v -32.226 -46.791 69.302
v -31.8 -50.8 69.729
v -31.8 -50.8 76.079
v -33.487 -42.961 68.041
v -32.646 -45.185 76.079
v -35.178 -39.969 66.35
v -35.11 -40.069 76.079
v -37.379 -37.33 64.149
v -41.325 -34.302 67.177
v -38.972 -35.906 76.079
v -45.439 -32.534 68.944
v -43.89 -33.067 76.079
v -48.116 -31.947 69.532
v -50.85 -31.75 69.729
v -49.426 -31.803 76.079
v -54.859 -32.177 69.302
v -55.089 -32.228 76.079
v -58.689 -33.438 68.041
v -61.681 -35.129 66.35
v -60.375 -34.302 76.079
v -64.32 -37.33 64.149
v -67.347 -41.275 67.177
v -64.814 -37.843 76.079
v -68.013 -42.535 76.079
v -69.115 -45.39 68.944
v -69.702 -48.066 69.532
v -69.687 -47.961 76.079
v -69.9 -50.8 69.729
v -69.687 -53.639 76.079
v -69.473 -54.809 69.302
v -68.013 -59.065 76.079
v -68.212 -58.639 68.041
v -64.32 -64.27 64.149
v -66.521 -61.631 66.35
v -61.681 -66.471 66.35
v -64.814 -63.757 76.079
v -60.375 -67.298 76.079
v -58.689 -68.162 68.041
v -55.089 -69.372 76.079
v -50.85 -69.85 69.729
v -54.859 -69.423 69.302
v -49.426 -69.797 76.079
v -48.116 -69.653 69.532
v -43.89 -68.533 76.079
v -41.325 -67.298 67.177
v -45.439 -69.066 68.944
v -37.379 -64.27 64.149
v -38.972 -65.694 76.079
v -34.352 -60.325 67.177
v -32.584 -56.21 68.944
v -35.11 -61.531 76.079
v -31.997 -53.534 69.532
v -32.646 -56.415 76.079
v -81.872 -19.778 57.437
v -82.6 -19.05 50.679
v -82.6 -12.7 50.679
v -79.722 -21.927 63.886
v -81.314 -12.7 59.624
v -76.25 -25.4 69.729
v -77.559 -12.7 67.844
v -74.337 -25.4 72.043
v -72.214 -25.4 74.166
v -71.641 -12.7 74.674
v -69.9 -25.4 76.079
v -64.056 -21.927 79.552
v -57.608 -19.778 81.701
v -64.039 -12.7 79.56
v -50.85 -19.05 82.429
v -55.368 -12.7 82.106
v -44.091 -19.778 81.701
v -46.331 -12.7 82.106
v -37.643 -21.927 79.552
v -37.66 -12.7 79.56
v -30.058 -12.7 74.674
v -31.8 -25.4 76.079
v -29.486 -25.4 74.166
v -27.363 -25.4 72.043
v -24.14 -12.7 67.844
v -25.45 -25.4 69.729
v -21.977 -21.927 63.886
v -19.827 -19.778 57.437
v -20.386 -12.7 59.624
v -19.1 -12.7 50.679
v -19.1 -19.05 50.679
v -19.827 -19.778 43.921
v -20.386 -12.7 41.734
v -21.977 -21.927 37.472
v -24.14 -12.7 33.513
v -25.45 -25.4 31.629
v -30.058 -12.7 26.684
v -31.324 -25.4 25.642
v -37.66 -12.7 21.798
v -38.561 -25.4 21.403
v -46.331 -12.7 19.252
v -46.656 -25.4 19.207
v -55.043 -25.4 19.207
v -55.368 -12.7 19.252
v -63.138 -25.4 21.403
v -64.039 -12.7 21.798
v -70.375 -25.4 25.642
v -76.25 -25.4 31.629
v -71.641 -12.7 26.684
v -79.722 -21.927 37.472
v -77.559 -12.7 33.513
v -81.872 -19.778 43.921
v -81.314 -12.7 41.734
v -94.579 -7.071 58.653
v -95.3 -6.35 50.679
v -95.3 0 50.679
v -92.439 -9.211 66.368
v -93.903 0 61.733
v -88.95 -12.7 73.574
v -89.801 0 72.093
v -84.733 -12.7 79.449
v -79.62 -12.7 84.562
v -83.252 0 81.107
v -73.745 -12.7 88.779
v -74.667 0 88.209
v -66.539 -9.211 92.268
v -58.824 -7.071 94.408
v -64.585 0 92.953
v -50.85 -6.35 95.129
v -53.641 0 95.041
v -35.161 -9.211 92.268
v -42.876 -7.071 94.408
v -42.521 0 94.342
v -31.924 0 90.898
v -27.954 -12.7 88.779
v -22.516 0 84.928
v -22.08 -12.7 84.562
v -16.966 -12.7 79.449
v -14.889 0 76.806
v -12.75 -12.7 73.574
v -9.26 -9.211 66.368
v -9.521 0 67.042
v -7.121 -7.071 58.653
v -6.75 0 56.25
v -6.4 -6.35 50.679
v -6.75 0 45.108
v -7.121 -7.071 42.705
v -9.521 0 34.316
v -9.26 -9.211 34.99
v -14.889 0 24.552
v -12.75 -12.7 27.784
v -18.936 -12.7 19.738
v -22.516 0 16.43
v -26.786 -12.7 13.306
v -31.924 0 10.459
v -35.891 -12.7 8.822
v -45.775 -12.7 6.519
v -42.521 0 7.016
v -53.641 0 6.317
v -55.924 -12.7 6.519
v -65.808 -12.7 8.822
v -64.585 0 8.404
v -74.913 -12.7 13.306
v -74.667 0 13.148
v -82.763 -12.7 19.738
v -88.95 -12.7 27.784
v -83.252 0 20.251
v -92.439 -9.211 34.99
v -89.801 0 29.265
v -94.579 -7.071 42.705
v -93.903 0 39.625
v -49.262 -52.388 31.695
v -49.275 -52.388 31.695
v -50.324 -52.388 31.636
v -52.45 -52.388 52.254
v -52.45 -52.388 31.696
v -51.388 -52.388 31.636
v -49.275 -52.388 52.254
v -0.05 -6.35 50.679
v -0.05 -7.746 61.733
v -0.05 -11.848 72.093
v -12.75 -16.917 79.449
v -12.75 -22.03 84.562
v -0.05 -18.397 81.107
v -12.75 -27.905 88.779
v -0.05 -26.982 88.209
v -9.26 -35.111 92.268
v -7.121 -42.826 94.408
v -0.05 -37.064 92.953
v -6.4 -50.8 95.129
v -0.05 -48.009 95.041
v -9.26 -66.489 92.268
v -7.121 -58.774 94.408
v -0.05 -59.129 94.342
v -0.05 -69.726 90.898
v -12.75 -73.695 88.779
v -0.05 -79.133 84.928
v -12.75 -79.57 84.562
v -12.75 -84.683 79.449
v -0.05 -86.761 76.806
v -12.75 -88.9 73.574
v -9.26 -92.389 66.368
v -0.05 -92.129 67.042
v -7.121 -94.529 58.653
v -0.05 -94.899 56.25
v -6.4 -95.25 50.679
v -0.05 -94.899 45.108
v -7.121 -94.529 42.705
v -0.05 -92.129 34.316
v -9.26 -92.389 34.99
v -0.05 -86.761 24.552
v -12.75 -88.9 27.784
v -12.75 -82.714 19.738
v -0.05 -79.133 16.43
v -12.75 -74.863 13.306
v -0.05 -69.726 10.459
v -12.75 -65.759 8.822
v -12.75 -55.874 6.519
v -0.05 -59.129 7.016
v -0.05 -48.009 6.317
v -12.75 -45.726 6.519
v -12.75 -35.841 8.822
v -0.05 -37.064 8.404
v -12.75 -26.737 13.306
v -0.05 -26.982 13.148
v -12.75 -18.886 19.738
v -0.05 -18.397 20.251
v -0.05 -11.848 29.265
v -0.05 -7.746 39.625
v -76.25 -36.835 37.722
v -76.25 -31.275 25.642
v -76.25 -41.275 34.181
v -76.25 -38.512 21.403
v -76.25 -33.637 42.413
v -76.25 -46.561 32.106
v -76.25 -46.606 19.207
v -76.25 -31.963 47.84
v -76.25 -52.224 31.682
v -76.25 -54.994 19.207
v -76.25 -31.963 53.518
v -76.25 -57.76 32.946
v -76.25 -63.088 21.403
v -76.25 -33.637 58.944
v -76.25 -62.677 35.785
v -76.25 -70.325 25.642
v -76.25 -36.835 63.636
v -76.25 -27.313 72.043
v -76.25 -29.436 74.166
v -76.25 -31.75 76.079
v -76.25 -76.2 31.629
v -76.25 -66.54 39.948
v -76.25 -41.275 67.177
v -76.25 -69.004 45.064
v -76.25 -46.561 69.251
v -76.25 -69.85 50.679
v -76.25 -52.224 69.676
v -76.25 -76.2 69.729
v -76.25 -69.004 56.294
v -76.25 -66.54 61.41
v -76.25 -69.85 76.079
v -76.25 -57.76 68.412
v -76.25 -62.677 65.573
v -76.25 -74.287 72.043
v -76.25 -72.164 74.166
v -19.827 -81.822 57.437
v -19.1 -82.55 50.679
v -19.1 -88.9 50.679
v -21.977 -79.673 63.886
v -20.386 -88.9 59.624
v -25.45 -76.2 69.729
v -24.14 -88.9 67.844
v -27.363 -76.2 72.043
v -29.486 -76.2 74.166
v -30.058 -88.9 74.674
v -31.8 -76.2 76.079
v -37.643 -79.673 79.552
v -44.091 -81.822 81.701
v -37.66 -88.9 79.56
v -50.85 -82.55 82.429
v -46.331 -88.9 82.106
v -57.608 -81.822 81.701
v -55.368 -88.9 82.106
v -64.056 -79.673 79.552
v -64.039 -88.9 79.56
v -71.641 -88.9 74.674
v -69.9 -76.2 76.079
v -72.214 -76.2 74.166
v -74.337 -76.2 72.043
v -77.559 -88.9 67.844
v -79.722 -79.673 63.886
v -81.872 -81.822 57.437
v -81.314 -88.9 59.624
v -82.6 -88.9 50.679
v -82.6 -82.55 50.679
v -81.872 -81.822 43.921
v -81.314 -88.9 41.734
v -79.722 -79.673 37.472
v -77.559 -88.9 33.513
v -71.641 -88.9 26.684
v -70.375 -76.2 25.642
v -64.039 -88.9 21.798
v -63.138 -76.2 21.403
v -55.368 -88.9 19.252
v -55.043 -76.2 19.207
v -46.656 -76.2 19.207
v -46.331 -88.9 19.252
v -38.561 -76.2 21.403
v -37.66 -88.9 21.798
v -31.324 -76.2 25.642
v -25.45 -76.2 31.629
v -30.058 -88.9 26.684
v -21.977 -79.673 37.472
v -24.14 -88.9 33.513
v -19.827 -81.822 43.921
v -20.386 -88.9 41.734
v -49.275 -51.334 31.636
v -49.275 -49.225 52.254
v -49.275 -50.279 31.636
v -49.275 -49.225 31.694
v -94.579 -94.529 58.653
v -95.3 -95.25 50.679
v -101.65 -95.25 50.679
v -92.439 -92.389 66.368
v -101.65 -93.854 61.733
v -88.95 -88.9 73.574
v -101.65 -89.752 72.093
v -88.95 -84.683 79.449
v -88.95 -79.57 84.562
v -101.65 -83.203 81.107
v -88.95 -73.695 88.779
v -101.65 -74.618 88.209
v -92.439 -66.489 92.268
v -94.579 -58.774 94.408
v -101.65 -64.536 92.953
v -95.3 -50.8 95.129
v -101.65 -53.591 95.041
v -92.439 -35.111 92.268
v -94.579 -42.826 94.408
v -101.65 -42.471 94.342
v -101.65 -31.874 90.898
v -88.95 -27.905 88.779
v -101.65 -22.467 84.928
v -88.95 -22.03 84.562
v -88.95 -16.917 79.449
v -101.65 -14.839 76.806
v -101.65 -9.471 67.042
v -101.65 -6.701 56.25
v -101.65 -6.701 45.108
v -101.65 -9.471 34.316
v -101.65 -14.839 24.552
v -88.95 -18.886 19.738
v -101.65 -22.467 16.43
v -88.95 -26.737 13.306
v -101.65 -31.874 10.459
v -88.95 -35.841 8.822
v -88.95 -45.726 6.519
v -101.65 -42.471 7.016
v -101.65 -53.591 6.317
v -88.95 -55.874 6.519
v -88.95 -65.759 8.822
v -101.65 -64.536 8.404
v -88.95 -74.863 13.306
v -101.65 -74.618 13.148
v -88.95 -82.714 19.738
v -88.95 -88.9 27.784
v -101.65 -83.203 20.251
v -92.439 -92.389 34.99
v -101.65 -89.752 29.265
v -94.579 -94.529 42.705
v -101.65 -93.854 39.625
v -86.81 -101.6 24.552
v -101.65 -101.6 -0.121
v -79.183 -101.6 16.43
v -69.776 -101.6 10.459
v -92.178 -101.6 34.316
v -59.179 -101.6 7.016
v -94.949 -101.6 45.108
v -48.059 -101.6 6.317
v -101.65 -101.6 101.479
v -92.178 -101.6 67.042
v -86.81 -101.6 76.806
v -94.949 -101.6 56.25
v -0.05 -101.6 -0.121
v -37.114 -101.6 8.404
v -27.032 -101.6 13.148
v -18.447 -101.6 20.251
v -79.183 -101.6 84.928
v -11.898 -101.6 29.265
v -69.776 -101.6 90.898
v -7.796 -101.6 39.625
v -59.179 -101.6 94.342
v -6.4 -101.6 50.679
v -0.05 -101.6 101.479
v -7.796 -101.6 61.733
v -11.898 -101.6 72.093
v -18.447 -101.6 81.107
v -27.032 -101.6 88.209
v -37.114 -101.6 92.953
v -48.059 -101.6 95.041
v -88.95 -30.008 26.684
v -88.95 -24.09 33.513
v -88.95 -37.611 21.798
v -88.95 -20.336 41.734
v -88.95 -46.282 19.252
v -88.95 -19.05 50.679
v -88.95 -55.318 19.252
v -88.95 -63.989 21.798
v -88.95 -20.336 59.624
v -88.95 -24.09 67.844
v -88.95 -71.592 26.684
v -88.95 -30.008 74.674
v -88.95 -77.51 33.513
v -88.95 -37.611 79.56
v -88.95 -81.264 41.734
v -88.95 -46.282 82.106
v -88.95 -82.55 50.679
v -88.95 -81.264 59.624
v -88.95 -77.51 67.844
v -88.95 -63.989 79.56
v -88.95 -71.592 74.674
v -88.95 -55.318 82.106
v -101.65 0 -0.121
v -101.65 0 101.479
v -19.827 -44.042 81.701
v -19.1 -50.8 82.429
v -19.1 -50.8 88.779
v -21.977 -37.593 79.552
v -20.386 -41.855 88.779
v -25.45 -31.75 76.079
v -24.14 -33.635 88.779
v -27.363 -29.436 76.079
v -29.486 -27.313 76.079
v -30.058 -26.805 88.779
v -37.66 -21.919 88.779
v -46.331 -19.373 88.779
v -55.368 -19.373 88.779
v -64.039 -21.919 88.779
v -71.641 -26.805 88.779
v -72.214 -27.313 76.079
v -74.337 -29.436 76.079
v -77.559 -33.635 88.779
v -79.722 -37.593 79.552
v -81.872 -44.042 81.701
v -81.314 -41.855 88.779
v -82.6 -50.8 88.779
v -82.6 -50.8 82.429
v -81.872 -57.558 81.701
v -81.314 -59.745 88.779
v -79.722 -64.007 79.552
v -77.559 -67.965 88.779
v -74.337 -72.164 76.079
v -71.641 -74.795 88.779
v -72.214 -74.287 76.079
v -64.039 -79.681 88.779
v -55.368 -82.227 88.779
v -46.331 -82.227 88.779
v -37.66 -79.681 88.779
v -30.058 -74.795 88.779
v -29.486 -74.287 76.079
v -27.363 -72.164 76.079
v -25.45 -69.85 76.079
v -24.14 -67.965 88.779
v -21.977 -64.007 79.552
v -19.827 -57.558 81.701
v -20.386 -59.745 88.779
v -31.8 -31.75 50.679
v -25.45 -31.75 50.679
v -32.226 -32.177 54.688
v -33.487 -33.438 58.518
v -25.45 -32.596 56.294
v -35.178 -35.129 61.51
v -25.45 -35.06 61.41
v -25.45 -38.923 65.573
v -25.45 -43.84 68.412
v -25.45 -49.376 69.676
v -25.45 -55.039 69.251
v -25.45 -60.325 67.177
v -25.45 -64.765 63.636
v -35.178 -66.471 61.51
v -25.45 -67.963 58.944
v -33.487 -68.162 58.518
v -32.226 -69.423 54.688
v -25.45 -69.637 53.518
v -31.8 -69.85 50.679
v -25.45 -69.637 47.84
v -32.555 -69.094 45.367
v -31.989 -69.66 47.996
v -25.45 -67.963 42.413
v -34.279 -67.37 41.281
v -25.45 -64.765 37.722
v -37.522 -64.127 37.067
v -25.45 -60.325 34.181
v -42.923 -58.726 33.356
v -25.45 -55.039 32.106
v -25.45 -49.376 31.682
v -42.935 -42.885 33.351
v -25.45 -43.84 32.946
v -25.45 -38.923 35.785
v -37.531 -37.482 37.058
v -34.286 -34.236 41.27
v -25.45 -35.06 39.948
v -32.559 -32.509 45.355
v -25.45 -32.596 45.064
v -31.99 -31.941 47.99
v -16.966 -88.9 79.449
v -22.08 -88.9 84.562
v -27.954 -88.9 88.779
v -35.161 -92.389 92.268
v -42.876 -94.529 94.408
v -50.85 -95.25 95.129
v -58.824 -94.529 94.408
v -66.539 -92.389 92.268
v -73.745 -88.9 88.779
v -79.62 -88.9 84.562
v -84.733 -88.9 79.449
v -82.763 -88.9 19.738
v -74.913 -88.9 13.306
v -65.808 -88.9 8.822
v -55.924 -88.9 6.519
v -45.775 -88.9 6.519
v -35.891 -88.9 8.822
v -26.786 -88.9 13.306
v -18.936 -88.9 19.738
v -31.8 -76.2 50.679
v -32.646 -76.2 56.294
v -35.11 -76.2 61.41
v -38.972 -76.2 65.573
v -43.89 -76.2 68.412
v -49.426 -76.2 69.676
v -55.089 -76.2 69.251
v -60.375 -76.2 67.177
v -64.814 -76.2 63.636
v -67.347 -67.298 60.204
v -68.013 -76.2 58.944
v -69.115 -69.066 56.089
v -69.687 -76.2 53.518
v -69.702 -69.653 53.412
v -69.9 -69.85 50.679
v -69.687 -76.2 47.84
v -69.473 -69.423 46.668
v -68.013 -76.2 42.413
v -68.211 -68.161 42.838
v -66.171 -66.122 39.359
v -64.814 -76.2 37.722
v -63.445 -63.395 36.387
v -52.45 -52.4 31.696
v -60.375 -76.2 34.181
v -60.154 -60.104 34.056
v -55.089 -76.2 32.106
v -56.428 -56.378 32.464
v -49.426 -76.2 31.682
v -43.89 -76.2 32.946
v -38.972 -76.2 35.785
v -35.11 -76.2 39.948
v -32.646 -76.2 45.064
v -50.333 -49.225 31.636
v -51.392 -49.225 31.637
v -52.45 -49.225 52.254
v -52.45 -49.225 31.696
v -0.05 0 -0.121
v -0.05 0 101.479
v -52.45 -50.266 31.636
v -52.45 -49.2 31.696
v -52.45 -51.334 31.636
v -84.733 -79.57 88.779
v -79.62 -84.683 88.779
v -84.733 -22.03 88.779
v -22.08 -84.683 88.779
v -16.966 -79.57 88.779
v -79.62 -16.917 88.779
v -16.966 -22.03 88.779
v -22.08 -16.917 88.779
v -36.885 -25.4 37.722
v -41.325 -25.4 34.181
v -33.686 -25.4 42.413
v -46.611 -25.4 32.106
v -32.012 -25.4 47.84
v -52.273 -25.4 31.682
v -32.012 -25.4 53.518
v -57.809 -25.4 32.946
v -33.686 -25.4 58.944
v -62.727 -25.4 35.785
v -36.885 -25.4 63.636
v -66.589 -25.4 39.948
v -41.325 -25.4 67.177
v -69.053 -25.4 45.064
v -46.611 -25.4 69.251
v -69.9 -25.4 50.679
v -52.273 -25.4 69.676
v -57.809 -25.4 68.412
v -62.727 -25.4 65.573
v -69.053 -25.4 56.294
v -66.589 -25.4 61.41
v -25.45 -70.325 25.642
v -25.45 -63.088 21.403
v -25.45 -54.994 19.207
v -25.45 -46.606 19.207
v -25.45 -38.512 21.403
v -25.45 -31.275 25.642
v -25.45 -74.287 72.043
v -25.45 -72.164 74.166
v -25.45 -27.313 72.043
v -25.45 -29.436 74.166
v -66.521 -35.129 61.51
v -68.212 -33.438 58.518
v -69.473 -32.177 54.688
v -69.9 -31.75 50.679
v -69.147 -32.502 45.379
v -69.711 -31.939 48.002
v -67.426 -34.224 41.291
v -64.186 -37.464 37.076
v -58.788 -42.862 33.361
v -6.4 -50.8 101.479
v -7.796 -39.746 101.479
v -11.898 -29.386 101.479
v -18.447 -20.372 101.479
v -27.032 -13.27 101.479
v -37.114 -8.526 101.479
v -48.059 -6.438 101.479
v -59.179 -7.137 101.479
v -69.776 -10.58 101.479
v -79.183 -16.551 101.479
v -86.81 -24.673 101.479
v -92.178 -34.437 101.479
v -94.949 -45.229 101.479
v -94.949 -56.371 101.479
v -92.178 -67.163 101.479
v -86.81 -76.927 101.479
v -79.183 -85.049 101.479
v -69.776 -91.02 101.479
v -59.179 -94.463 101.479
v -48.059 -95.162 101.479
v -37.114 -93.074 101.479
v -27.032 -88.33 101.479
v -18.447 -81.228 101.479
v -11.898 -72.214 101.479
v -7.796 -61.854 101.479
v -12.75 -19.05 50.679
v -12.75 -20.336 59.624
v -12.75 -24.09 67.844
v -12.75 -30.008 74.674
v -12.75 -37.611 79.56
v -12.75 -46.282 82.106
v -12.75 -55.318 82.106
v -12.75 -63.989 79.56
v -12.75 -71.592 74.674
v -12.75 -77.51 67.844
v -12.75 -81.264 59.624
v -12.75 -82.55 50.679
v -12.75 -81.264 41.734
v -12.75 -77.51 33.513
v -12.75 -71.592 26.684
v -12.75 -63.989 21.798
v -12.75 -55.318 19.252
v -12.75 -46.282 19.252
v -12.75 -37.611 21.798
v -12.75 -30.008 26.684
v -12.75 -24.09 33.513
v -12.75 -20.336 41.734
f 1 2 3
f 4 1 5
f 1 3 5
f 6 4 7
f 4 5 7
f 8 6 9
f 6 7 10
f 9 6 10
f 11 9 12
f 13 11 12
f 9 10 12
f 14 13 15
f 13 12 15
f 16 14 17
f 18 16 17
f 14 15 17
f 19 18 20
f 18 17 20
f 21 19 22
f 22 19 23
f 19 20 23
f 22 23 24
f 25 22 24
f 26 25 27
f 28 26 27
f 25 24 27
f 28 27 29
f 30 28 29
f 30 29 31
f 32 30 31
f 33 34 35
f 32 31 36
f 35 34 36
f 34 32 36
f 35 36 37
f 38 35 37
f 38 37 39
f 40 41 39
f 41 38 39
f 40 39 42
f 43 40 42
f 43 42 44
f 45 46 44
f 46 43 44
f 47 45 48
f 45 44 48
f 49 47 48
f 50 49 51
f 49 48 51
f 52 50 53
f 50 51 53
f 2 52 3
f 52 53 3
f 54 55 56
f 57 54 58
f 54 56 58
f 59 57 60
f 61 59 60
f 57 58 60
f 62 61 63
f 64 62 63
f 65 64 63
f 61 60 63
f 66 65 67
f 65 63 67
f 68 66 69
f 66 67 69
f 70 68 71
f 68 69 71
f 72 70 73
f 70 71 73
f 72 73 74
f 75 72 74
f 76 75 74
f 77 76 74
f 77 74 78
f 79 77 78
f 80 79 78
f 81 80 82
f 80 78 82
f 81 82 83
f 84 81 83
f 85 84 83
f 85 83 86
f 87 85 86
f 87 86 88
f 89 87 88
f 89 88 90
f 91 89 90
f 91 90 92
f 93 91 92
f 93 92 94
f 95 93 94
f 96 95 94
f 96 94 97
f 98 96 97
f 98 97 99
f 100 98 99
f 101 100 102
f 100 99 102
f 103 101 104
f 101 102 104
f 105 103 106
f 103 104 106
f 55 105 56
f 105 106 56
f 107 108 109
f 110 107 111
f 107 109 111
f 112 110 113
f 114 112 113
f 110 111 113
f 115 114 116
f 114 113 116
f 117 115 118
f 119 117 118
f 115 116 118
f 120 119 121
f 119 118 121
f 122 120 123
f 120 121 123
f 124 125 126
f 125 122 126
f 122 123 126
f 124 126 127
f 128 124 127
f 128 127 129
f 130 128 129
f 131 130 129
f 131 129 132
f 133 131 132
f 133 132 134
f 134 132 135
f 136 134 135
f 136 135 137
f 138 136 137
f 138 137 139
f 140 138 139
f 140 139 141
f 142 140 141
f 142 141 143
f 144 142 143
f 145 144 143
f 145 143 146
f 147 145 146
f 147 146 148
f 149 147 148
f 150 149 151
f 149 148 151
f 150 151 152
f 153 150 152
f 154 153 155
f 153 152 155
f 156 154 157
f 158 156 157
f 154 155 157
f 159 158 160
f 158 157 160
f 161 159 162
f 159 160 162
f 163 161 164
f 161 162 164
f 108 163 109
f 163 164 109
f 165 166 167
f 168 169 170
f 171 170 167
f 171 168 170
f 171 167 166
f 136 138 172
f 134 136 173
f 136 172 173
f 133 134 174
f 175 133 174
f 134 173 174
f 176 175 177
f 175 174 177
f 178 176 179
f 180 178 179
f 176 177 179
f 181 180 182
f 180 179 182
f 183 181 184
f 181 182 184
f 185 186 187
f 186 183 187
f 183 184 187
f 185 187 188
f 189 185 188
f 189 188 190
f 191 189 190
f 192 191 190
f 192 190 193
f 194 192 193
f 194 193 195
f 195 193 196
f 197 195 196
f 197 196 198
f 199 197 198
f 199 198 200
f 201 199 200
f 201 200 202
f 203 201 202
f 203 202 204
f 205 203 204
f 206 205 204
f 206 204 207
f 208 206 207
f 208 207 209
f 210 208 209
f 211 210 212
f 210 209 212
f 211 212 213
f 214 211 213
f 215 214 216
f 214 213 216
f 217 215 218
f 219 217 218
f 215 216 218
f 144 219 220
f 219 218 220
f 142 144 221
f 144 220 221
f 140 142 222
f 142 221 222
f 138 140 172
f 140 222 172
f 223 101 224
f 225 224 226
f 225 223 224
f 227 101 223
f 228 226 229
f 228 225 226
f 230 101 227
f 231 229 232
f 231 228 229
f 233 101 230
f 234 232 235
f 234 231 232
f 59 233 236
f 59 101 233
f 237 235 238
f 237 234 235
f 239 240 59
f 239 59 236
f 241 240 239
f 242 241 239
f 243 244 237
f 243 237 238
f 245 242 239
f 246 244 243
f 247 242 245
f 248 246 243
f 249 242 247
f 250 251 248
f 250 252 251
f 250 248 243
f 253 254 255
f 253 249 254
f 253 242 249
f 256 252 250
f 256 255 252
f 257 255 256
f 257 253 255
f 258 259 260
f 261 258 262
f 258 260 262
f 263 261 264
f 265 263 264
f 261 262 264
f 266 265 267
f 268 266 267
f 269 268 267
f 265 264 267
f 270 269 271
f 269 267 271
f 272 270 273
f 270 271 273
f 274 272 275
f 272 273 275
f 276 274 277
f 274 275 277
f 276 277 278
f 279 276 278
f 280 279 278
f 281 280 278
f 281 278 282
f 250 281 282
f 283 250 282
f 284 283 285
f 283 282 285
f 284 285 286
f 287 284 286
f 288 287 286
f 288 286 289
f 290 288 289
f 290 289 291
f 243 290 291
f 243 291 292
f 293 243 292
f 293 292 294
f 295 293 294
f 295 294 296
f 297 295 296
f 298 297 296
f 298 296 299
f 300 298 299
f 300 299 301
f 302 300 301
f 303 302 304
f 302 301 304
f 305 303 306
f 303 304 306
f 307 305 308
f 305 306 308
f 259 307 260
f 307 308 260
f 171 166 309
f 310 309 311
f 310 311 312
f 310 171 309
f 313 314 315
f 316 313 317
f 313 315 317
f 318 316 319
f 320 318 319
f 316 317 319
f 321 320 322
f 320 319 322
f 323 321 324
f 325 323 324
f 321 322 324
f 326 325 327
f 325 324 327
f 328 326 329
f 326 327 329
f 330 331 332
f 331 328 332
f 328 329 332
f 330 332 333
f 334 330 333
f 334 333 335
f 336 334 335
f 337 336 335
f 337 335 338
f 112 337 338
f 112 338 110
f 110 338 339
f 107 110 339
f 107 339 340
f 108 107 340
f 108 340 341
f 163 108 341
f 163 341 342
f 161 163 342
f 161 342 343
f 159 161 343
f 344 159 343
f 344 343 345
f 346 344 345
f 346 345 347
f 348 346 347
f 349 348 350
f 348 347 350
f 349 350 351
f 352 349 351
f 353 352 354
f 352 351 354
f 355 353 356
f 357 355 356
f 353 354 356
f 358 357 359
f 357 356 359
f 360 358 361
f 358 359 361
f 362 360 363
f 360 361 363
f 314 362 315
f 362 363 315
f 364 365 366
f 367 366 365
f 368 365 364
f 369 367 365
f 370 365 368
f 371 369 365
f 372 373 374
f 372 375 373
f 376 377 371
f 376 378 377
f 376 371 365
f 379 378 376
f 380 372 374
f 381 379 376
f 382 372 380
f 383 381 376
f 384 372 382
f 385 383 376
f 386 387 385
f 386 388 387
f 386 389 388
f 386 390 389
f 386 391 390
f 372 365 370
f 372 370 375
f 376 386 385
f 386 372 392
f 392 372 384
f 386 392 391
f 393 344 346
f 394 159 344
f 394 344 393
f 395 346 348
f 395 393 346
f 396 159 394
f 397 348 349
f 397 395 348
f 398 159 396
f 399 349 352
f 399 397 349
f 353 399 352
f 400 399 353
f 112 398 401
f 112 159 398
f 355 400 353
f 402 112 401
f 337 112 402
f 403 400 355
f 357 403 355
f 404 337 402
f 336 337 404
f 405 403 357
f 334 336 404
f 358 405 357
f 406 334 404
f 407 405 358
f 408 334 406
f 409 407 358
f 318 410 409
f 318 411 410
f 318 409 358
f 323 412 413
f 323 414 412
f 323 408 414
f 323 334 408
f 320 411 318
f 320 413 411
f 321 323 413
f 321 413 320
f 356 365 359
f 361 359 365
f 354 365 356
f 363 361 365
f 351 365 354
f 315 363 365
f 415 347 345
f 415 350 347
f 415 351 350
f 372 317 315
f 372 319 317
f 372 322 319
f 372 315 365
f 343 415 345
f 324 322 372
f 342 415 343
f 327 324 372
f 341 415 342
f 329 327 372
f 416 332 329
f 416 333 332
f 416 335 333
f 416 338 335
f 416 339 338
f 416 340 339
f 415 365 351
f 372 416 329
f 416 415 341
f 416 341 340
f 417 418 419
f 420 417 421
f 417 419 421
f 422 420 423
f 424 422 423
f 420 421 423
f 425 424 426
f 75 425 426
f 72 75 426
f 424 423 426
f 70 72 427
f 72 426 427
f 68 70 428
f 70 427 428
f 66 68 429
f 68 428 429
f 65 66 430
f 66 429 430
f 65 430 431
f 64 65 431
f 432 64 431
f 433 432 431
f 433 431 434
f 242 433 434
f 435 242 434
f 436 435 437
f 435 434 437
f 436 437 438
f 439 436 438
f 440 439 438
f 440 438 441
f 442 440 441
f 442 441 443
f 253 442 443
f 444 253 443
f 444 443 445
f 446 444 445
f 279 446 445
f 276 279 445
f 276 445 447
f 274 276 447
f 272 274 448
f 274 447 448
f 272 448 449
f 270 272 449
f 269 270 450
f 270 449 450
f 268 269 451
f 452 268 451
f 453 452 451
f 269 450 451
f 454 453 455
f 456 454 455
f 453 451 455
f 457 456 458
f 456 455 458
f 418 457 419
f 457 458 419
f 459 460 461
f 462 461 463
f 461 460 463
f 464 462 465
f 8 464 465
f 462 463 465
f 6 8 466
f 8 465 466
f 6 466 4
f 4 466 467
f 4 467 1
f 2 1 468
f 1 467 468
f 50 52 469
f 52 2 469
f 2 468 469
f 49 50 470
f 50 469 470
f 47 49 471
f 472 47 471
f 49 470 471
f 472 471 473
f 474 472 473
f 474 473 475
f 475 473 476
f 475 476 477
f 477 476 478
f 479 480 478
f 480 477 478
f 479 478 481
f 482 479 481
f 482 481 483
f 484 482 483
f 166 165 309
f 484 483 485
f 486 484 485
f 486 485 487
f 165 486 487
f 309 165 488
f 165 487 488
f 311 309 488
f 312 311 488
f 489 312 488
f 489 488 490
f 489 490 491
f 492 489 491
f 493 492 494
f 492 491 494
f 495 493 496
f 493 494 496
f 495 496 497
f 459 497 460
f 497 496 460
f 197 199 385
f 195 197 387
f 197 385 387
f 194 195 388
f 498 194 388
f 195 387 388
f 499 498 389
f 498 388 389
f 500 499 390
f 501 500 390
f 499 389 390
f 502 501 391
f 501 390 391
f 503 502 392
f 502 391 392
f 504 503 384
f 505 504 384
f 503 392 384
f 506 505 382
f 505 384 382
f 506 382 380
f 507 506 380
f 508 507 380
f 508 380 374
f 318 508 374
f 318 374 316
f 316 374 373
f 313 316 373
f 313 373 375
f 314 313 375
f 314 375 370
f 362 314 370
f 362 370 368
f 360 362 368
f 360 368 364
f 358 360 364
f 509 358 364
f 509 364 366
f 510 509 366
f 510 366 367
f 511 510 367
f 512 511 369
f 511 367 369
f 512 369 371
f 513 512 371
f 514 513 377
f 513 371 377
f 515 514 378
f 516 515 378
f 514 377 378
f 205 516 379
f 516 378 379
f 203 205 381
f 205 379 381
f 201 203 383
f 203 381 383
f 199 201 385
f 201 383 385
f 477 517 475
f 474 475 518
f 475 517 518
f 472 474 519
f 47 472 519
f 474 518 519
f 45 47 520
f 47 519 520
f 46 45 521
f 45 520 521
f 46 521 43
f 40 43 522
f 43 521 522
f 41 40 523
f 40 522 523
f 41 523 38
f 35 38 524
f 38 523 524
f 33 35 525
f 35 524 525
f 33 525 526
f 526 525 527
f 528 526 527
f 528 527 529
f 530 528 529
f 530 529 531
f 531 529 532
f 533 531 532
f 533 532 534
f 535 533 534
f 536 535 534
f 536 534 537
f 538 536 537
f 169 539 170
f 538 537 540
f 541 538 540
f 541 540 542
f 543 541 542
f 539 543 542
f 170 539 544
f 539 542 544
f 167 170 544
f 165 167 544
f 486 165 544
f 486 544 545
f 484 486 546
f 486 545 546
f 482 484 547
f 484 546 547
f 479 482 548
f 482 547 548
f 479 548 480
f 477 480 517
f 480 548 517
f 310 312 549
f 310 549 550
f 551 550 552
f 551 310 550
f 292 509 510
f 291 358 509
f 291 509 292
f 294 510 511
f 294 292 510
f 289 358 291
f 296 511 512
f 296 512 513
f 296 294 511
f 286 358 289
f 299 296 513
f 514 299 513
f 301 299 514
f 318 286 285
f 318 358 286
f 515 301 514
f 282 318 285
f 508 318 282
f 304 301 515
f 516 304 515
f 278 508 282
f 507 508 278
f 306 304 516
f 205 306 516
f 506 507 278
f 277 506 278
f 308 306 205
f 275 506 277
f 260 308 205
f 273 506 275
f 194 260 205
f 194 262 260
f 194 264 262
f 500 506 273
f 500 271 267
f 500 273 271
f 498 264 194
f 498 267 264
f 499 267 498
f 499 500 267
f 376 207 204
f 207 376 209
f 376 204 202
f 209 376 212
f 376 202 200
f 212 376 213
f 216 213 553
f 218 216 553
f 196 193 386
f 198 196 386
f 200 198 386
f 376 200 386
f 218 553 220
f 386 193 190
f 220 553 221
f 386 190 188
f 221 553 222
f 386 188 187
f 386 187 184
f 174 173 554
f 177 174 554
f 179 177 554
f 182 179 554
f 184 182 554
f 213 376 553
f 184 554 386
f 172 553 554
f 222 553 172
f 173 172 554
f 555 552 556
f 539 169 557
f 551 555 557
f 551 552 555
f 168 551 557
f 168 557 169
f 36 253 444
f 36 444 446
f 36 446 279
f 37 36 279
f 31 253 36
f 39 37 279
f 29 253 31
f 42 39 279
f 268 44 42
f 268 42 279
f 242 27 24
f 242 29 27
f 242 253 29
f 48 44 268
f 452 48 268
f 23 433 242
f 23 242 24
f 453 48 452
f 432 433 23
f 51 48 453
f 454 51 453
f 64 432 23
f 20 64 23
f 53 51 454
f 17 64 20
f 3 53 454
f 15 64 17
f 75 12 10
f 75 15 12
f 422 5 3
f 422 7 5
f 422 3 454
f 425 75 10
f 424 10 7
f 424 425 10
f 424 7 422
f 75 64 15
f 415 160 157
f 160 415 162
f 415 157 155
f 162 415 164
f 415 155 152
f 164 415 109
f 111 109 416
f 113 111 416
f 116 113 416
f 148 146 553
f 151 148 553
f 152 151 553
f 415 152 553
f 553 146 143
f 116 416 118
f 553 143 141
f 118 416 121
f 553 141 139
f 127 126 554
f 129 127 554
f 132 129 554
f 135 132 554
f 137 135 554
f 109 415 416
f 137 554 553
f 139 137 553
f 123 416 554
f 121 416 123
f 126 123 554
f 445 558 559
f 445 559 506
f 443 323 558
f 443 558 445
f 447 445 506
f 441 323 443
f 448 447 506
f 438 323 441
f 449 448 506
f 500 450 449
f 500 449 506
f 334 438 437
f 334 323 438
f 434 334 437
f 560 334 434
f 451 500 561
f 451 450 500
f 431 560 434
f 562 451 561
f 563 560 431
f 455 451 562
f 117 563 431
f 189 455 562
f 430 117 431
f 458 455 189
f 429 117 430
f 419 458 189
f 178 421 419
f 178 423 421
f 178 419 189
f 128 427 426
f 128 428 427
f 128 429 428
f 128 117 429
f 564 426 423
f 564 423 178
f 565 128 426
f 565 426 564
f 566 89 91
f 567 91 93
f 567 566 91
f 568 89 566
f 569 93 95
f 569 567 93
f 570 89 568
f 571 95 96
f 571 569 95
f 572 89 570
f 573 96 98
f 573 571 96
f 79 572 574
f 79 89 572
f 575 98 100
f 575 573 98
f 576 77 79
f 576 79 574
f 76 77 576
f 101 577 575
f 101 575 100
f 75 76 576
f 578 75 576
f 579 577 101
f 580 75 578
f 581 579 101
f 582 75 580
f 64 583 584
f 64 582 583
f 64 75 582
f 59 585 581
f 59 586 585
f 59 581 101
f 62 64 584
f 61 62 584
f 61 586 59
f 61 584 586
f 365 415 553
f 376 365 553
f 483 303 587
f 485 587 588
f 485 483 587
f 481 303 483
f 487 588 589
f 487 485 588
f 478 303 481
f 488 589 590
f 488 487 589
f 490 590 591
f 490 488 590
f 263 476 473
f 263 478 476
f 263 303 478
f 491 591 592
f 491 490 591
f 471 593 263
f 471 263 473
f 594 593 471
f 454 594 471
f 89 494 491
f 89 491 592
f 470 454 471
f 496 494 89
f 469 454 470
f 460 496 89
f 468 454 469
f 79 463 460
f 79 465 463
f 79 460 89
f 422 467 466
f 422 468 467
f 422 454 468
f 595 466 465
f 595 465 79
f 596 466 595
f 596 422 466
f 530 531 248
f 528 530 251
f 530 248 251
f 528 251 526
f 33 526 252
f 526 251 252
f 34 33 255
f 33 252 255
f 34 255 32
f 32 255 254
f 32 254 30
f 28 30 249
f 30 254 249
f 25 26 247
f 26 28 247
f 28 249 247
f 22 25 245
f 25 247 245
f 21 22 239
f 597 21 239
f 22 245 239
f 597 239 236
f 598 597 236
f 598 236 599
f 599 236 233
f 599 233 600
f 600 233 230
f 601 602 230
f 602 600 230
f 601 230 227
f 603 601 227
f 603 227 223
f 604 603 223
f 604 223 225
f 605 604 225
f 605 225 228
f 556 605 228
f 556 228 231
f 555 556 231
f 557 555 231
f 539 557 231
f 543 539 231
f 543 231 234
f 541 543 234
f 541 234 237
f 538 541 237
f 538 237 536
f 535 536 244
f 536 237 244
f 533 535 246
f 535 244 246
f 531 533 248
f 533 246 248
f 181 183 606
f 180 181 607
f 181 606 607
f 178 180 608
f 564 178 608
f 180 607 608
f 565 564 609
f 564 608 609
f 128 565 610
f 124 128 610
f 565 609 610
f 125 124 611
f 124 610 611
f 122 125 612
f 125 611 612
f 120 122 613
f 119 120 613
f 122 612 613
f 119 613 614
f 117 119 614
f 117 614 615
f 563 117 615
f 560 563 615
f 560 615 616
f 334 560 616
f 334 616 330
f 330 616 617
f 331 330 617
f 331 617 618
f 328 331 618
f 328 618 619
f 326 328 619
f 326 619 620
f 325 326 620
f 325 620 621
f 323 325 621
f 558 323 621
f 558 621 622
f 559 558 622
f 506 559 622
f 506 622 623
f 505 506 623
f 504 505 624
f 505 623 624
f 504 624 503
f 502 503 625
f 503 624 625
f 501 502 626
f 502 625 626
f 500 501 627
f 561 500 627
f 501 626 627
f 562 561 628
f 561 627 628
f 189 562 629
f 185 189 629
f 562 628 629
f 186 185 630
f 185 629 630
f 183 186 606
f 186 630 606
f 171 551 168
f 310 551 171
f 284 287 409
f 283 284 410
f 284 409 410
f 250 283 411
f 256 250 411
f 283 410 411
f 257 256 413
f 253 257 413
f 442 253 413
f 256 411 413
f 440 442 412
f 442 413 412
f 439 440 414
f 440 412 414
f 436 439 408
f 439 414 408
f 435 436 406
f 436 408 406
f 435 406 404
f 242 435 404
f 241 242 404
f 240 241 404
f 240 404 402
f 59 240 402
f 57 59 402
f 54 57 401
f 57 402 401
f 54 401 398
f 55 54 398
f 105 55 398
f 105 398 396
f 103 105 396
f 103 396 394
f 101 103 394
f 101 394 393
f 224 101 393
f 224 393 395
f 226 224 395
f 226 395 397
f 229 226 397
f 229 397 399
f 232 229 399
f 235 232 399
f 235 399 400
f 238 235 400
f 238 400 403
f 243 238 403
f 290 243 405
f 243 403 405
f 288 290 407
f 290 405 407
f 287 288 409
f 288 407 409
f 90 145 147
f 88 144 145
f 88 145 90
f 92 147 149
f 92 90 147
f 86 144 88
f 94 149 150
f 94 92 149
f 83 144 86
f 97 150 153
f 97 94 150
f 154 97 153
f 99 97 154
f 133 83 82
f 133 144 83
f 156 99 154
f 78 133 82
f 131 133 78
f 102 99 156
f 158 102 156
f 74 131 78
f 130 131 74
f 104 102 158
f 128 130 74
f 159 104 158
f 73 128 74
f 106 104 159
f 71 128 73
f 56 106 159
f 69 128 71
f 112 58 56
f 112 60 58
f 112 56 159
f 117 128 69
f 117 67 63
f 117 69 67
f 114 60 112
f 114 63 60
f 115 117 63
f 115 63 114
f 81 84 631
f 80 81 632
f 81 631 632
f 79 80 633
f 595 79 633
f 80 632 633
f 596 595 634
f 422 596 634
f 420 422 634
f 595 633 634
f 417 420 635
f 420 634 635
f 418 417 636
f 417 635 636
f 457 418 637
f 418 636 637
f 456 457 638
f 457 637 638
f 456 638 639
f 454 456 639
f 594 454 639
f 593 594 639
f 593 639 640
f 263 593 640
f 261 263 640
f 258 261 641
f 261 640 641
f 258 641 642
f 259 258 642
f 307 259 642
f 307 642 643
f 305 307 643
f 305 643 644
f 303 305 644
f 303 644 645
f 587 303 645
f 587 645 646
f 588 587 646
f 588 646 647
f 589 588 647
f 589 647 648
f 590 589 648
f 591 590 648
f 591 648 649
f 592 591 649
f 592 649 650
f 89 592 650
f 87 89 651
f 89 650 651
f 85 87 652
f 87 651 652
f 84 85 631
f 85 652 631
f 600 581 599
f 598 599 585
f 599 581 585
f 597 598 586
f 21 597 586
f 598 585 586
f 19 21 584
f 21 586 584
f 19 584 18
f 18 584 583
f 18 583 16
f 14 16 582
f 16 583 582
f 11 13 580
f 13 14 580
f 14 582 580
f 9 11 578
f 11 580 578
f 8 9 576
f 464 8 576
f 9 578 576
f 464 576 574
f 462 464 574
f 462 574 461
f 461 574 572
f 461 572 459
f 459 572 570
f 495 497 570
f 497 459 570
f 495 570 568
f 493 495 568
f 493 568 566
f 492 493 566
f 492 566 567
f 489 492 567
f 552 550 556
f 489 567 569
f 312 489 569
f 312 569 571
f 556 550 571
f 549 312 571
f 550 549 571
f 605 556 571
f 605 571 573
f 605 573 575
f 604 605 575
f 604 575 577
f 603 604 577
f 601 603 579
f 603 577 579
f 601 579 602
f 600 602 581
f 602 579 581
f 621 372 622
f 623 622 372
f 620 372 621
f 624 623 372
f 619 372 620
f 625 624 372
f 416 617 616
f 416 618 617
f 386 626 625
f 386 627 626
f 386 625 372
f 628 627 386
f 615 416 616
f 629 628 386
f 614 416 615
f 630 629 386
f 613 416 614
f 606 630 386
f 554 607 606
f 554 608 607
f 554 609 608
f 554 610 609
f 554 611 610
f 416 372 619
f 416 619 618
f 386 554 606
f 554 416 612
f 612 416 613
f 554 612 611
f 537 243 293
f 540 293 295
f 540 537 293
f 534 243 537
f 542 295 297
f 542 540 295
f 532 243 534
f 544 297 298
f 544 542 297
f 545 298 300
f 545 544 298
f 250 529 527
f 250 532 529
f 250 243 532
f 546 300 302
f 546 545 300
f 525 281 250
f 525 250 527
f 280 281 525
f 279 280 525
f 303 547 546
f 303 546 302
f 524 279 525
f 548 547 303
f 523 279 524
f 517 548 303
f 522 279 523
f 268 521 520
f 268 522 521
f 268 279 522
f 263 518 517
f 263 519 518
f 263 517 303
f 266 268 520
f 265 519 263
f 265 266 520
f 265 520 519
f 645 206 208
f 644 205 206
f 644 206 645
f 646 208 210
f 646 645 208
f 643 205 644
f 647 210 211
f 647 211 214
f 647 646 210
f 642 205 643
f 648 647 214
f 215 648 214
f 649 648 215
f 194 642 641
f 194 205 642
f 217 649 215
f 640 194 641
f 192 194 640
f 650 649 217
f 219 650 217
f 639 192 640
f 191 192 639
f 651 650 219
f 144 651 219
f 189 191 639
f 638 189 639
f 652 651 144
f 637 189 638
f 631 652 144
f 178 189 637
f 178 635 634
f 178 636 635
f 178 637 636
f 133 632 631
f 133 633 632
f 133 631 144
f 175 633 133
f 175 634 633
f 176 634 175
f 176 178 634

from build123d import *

# Parameters (mm, degrees)
F0_W      = 101.6
F0_H      = 101.6
F1_DEPTH  = 101.6
F2_R      = 44.45
F3_DEPTH  = 12.7
F4_R      = 31.75
F5_DEPTH  = 12.7
F6_R      = 19.05
F7_DEPTH  = 23.8125
F8_R      = 44.45
F8_R_2    = 31.75
F8_R_3    = 19.05
F9_DEPTH  = 12.7
F10_DEPTH = 25.4
F11_DEPTH = 49.2252
F12_R     = 19.05
F15_DEPTH = 49.2252
F13_R     = 19.05
F16_DEPTH = 49.2252
F13_R_2   = 31.75
F17_DEPTH = 25.4
F13_R_3   = 44.45
F18_DEPTH = 12.7
F14_R     = 19.05
F19_DEPTH = 49.1998
F14_R_2   = 31.75
F20_DEPTH = 25.4
F14_R_3   = 44.45
F21_DEPTH = 12.7
F12_R_2   = 31.75
F22_DEPTH = 25.4
F12_R_3   = 44.45
F23_DEPTH = 12.7


with BuildPart() as f1:
    # F0 (on Front) → F1 (new body)
    with BuildSketch(Plane.XZ):
        with Locations((-50.849611, 50.678841)):
            Rectangle(F0_W, F0_H)
    extrude(amount=F1_DEPTH)

    # F2 (on face) → F3 (cut)
    with BuildSketch(Plane.XZ.offset(101.6)):
        with Locations((-50.849611, 50.678841)):
            Circle(F2_R)
    extrude(amount=-F3_DEPTH, mode=Mode.SUBTRACT)

    # F4 (on face) → F5 (cut)
    with BuildSketch(Plane.XZ.offset(88.9)):
        with Locations((-50.849611, 50.678841)):
            Circle(F4_R)
    extrude(amount=-F5_DEPTH, mode=Mode.SUBTRACT)

    # F6 (on face) → F7 (cut)
    with BuildSketch(Plane.XZ.offset(76.2)):
        with Locations((-50.849611, 50.678841)):
            Circle(F6_R)
    extrude(amount=-F7_DEPTH, mode=Mode.SUBTRACT)

    # F8 (on face) → F9 (cut)
    with BuildSketch(Plane.XY.offset(101.478841)):
        with Locations((-50.849611, -50.8)):
            Circle(F8_R)
        with Locations((-50.849611, -50.8)):
            Circle(F8_R_2, mode=Mode.SUBTRACT)
        with Locations((-50.849611, -50.8)):
            Circle(F8_R_2)
        with Locations((-50.849611, -50.8)):
            Circle(F8_R_3, mode=Mode.SUBTRACT)
        with Locations((-50.849611, -50.8)):
            Circle(F8_R_3)
    extrude(amount=-F9_DEPTH, mode=Mode.SUBTRACT)

    # F8 (on face) → F10 (cut)
    with BuildSketch(Plane.XY.offset(101.478841)):
        with Locations((-50.849611, -50.8)):
            Circle(F8_R_2)
        with Locations((-50.849611, -50.8)):
            Circle(F8_R_3, mode=Mode.SUBTRACT)
        with Locations((-50.849611, -50.8)):
            Circle(F8_R_3)
    extrude(amount=-F10_DEPTH, mode=Mode.SUBTRACT)

    # F8 (on face) → F11 (cut)
    with BuildSketch(Plane.XY.offset(101.478841)):
        with Locations((-50.849611, -50.8)):
            Circle(F8_R_3)
    extrude(amount=-F11_DEPTH, mode=Mode.SUBTRACT)

    # F12 (on face) → F15 (cut)
    with BuildSketch(Plane.YZ.offset(-0.049611)):
        with Locations((-50.8, 50.678841)):
            Circle(F12_R)
    extrude(amount=-F15_DEPTH, mode=Mode.SUBTRACT)

    # F13 (on face) → F16 (cut)
    with BuildSketch(Plane(origin=(0, 0, 0), x_dir=(-1, 0, 0), z_dir=(0, 1, 0))):
        with Locations((50.849611, 50.678841)):
            Circle(F13_R)
    extrude(amount=-F16_DEPTH, mode=Mode.SUBTRACT)

    # F13 (on face) → F17 (cut)
    with BuildSketch(Plane(origin=(0, 0, 0), x_dir=(-1, 0, 0), z_dir=(0, 1, 0))):
        with Locations((50.849611, 50.678841)):
            Circle(F13_R_2)
        with Locations((50.849611, 50.678841)):
            Circle(F13_R, mode=Mode.SUBTRACT)
    extrude(amount=-F17_DEPTH, mode=Mode.SUBTRACT)

    # F13 (on face) → F18 (cut)
    with BuildSketch(Plane(origin=(0, 0, 0), x_dir=(-1, 0, 0), z_dir=(0, 1, 0))):
        with Locations((50.849611, 50.678841)):
            Circle(F13_R_3)
        with Locations((50.849611, 50.678841)):
            Circle(F13_R_2, mode=Mode.SUBTRACT)
    extrude(amount=-F18_DEPTH, mode=Mode.SUBTRACT)

    # F14 (on face) → F19 (cut)
    with BuildSketch(Plane(origin=(-101.649611, 0, 0), x_dir=(0, -1, 0), z_dir=(-1, 0, 0))):
        with Locations((50.8, 50.678841)):
            Circle(F14_R)
    extrude(amount=-F19_DEPTH, mode=Mode.SUBTRACT)

    # F14 (on face) → F20 (cut)
    with BuildSketch(Plane(origin=(-101.649611, 0, 0), x_dir=(0, -1, 0), z_dir=(-1, 0, 0))):
        with Locations((50.8, 50.678841)):
            Circle(F14_R_2)
        with Locations((50.8, 50.678841)):
            Circle(F14_R, mode=Mode.SUBTRACT)
    extrude(amount=-F20_DEPTH, mode=Mode.SUBTRACT)

    # F14 (on face) → F21 (cut)
    with BuildSketch(Plane(origin=(-101.649611, 0, 0), x_dir=(0, -1, 0), z_dir=(-1, 0, 0))):
        with Locations((50.8, 50.678841)):
            Circle(F14_R_3)
        with Locations((50.8, 50.678841)):
            Circle(F14_R_2, mode=Mode.SUBTRACT)
    extrude(amount=-F21_DEPTH, mode=Mode.SUBTRACT)

    # F12 (on face) → F22 (cut)
    with BuildSketch(Plane.YZ.offset(-0.049611)):
        with Locations((-50.8, 50.678841)):
            Circle(F12_R_2)
        with Locations((-50.8, 50.678841)):
            Circle(F12_R, mode=Mode.SUBTRACT)
    extrude(amount=-F22_DEPTH, mode=Mode.SUBTRACT)

    # F12 (on face) → F23 (cut)
    with BuildSketch(Plane.YZ.offset(-0.049611)):
        with Locations((-50.8, 50.678841)):
            Circle(F12_R_3)
        with Locations((-50.8, 50.678841)):
            Circle(F12_R_2, mode=Mode.SUBTRACT)
    extrude(amount=-F23_DEPTH, mode=Mode.SUBTRACT)


solid = f1.part
